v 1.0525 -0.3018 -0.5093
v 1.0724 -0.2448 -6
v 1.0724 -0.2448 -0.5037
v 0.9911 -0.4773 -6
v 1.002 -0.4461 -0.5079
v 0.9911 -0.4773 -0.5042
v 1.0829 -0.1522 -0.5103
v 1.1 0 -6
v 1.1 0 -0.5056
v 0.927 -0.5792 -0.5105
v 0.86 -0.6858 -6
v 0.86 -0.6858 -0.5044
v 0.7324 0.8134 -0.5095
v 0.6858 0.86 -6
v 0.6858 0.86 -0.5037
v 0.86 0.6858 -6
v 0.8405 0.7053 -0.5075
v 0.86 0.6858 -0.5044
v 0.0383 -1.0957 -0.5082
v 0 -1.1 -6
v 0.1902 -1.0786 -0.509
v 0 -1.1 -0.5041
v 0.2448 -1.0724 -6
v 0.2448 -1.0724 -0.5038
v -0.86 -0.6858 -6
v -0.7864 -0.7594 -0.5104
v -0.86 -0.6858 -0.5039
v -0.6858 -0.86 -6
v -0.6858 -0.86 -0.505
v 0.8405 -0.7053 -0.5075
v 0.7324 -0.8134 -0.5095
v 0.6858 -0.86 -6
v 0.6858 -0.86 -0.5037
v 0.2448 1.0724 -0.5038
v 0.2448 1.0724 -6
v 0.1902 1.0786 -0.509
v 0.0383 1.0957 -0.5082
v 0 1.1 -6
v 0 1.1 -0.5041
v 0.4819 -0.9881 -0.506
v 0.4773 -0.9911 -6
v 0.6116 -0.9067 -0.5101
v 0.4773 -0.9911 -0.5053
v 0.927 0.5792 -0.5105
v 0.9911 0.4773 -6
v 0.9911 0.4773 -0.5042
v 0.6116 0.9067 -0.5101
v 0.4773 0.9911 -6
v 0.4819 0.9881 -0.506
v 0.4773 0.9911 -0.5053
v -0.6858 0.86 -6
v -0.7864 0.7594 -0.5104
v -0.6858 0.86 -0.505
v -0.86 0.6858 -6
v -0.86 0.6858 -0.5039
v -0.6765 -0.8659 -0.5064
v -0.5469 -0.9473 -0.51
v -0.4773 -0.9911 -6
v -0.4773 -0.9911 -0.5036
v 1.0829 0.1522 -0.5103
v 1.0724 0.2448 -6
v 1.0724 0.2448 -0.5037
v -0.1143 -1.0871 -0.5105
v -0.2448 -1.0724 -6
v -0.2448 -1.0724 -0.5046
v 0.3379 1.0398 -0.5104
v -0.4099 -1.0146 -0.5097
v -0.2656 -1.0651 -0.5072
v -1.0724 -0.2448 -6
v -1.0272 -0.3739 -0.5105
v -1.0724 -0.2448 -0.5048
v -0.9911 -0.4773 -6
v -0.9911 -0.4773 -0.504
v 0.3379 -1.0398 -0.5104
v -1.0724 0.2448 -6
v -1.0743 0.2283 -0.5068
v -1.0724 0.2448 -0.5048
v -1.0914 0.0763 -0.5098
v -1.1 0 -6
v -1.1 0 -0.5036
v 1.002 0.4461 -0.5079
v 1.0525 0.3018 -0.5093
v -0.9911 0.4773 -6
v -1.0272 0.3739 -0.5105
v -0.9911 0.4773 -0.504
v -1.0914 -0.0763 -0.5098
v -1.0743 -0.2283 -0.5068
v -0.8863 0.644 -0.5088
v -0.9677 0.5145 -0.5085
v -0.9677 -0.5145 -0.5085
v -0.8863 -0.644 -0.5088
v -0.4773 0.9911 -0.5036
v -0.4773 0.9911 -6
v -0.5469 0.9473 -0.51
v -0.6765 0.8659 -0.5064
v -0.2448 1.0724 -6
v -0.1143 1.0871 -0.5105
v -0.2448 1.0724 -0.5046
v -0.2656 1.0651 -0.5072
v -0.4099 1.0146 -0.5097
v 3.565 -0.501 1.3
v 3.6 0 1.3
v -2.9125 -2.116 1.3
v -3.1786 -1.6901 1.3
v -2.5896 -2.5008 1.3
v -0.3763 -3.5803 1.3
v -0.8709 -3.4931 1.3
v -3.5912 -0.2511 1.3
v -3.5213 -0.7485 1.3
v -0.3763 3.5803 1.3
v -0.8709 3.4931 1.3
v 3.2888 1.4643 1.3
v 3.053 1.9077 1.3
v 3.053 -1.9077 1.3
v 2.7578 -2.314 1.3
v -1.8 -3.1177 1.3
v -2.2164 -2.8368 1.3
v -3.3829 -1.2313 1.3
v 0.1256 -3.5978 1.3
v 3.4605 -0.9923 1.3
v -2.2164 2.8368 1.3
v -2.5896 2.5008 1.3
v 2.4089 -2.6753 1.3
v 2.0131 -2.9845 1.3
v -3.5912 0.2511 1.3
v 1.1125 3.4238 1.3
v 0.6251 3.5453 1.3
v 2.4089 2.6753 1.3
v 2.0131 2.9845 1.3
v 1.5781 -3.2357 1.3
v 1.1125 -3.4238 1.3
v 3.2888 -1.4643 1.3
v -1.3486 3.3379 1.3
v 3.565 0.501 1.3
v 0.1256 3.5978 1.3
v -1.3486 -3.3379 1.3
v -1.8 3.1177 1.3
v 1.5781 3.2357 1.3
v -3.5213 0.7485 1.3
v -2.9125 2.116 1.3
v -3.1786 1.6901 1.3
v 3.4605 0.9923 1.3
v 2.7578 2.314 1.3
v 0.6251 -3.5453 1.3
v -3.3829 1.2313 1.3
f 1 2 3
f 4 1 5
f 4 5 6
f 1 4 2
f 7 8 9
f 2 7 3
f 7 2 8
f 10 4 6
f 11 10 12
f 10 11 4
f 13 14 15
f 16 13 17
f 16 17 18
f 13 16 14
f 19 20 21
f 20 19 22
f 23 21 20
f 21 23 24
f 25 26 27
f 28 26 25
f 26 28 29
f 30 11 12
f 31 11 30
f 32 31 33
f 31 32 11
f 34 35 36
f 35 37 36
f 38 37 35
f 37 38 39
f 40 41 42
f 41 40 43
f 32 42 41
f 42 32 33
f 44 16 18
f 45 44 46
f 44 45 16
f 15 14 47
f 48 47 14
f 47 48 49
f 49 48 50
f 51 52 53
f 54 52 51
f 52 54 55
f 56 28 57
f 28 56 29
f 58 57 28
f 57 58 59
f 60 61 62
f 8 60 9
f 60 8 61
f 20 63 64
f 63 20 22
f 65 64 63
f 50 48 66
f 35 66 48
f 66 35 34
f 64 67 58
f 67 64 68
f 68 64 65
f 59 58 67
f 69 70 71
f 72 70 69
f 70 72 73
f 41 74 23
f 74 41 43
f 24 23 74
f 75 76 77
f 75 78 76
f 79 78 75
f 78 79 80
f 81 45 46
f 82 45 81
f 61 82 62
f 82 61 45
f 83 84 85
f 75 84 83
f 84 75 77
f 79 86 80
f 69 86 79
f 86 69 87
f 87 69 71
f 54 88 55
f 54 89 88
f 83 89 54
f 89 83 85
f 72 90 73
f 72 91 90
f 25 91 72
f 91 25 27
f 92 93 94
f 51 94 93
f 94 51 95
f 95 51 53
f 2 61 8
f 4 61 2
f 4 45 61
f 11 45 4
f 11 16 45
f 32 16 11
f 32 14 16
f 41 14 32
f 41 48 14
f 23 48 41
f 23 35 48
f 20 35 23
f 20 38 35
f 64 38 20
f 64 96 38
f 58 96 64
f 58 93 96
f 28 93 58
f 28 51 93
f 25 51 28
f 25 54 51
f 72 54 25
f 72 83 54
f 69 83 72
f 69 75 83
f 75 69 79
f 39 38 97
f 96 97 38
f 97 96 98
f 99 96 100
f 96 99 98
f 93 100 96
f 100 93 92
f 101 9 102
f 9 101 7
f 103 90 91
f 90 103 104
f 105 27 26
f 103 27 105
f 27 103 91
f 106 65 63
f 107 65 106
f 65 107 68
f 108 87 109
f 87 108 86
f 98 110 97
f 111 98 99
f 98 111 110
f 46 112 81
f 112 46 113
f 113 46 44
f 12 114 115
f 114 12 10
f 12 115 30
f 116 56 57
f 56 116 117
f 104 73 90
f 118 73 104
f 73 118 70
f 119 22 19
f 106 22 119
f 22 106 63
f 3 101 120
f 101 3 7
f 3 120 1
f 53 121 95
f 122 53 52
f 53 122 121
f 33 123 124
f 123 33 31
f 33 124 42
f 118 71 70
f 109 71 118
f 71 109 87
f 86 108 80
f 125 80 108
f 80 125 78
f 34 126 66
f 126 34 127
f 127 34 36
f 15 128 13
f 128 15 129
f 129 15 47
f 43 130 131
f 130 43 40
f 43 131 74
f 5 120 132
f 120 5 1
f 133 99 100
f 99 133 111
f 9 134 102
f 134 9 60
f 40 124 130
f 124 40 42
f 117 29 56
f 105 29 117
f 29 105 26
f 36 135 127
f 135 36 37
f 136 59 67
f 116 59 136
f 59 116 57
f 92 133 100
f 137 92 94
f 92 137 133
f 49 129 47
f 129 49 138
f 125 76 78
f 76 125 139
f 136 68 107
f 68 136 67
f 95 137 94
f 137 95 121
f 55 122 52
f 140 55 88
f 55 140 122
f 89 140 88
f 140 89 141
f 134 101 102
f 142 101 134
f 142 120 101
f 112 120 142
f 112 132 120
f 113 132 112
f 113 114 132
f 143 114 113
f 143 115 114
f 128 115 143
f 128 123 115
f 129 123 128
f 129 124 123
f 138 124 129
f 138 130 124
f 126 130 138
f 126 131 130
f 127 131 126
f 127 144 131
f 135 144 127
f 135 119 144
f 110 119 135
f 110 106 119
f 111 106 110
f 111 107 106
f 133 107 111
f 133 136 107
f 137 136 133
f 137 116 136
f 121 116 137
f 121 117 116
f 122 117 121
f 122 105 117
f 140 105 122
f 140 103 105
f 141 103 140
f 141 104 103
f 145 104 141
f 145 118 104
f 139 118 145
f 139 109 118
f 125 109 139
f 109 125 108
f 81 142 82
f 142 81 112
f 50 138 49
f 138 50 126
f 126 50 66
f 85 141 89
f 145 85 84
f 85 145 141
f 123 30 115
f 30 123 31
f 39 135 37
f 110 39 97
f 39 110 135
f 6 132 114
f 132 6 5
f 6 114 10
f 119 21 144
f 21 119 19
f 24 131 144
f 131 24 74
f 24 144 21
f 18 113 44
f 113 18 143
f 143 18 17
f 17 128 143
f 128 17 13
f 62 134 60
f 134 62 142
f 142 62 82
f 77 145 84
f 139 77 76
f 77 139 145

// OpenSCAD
$fs = 0.25;
$fa = 8;

// size is the XY plane size, height in Z
module hexagon(size, height) {
  boxWidth = size/1.75;
  for (r = [-60, 0, 60]) rotate([0,0,r]) cube([boxWidth, size, height], true);
}

// screw bore extending downwards below z=0 plane 
// head extends a but above zero to allow for sinking it further
module screw2x6bore() {
    rotate([180, 0, 0]) {
        cylinder(d=2.2, h=6);
        translate ([0, 0, -1.3])
            cylinder(d1=2*3.6, d2=0, h=2*1.3);
    }
}

screw2x6bore();
